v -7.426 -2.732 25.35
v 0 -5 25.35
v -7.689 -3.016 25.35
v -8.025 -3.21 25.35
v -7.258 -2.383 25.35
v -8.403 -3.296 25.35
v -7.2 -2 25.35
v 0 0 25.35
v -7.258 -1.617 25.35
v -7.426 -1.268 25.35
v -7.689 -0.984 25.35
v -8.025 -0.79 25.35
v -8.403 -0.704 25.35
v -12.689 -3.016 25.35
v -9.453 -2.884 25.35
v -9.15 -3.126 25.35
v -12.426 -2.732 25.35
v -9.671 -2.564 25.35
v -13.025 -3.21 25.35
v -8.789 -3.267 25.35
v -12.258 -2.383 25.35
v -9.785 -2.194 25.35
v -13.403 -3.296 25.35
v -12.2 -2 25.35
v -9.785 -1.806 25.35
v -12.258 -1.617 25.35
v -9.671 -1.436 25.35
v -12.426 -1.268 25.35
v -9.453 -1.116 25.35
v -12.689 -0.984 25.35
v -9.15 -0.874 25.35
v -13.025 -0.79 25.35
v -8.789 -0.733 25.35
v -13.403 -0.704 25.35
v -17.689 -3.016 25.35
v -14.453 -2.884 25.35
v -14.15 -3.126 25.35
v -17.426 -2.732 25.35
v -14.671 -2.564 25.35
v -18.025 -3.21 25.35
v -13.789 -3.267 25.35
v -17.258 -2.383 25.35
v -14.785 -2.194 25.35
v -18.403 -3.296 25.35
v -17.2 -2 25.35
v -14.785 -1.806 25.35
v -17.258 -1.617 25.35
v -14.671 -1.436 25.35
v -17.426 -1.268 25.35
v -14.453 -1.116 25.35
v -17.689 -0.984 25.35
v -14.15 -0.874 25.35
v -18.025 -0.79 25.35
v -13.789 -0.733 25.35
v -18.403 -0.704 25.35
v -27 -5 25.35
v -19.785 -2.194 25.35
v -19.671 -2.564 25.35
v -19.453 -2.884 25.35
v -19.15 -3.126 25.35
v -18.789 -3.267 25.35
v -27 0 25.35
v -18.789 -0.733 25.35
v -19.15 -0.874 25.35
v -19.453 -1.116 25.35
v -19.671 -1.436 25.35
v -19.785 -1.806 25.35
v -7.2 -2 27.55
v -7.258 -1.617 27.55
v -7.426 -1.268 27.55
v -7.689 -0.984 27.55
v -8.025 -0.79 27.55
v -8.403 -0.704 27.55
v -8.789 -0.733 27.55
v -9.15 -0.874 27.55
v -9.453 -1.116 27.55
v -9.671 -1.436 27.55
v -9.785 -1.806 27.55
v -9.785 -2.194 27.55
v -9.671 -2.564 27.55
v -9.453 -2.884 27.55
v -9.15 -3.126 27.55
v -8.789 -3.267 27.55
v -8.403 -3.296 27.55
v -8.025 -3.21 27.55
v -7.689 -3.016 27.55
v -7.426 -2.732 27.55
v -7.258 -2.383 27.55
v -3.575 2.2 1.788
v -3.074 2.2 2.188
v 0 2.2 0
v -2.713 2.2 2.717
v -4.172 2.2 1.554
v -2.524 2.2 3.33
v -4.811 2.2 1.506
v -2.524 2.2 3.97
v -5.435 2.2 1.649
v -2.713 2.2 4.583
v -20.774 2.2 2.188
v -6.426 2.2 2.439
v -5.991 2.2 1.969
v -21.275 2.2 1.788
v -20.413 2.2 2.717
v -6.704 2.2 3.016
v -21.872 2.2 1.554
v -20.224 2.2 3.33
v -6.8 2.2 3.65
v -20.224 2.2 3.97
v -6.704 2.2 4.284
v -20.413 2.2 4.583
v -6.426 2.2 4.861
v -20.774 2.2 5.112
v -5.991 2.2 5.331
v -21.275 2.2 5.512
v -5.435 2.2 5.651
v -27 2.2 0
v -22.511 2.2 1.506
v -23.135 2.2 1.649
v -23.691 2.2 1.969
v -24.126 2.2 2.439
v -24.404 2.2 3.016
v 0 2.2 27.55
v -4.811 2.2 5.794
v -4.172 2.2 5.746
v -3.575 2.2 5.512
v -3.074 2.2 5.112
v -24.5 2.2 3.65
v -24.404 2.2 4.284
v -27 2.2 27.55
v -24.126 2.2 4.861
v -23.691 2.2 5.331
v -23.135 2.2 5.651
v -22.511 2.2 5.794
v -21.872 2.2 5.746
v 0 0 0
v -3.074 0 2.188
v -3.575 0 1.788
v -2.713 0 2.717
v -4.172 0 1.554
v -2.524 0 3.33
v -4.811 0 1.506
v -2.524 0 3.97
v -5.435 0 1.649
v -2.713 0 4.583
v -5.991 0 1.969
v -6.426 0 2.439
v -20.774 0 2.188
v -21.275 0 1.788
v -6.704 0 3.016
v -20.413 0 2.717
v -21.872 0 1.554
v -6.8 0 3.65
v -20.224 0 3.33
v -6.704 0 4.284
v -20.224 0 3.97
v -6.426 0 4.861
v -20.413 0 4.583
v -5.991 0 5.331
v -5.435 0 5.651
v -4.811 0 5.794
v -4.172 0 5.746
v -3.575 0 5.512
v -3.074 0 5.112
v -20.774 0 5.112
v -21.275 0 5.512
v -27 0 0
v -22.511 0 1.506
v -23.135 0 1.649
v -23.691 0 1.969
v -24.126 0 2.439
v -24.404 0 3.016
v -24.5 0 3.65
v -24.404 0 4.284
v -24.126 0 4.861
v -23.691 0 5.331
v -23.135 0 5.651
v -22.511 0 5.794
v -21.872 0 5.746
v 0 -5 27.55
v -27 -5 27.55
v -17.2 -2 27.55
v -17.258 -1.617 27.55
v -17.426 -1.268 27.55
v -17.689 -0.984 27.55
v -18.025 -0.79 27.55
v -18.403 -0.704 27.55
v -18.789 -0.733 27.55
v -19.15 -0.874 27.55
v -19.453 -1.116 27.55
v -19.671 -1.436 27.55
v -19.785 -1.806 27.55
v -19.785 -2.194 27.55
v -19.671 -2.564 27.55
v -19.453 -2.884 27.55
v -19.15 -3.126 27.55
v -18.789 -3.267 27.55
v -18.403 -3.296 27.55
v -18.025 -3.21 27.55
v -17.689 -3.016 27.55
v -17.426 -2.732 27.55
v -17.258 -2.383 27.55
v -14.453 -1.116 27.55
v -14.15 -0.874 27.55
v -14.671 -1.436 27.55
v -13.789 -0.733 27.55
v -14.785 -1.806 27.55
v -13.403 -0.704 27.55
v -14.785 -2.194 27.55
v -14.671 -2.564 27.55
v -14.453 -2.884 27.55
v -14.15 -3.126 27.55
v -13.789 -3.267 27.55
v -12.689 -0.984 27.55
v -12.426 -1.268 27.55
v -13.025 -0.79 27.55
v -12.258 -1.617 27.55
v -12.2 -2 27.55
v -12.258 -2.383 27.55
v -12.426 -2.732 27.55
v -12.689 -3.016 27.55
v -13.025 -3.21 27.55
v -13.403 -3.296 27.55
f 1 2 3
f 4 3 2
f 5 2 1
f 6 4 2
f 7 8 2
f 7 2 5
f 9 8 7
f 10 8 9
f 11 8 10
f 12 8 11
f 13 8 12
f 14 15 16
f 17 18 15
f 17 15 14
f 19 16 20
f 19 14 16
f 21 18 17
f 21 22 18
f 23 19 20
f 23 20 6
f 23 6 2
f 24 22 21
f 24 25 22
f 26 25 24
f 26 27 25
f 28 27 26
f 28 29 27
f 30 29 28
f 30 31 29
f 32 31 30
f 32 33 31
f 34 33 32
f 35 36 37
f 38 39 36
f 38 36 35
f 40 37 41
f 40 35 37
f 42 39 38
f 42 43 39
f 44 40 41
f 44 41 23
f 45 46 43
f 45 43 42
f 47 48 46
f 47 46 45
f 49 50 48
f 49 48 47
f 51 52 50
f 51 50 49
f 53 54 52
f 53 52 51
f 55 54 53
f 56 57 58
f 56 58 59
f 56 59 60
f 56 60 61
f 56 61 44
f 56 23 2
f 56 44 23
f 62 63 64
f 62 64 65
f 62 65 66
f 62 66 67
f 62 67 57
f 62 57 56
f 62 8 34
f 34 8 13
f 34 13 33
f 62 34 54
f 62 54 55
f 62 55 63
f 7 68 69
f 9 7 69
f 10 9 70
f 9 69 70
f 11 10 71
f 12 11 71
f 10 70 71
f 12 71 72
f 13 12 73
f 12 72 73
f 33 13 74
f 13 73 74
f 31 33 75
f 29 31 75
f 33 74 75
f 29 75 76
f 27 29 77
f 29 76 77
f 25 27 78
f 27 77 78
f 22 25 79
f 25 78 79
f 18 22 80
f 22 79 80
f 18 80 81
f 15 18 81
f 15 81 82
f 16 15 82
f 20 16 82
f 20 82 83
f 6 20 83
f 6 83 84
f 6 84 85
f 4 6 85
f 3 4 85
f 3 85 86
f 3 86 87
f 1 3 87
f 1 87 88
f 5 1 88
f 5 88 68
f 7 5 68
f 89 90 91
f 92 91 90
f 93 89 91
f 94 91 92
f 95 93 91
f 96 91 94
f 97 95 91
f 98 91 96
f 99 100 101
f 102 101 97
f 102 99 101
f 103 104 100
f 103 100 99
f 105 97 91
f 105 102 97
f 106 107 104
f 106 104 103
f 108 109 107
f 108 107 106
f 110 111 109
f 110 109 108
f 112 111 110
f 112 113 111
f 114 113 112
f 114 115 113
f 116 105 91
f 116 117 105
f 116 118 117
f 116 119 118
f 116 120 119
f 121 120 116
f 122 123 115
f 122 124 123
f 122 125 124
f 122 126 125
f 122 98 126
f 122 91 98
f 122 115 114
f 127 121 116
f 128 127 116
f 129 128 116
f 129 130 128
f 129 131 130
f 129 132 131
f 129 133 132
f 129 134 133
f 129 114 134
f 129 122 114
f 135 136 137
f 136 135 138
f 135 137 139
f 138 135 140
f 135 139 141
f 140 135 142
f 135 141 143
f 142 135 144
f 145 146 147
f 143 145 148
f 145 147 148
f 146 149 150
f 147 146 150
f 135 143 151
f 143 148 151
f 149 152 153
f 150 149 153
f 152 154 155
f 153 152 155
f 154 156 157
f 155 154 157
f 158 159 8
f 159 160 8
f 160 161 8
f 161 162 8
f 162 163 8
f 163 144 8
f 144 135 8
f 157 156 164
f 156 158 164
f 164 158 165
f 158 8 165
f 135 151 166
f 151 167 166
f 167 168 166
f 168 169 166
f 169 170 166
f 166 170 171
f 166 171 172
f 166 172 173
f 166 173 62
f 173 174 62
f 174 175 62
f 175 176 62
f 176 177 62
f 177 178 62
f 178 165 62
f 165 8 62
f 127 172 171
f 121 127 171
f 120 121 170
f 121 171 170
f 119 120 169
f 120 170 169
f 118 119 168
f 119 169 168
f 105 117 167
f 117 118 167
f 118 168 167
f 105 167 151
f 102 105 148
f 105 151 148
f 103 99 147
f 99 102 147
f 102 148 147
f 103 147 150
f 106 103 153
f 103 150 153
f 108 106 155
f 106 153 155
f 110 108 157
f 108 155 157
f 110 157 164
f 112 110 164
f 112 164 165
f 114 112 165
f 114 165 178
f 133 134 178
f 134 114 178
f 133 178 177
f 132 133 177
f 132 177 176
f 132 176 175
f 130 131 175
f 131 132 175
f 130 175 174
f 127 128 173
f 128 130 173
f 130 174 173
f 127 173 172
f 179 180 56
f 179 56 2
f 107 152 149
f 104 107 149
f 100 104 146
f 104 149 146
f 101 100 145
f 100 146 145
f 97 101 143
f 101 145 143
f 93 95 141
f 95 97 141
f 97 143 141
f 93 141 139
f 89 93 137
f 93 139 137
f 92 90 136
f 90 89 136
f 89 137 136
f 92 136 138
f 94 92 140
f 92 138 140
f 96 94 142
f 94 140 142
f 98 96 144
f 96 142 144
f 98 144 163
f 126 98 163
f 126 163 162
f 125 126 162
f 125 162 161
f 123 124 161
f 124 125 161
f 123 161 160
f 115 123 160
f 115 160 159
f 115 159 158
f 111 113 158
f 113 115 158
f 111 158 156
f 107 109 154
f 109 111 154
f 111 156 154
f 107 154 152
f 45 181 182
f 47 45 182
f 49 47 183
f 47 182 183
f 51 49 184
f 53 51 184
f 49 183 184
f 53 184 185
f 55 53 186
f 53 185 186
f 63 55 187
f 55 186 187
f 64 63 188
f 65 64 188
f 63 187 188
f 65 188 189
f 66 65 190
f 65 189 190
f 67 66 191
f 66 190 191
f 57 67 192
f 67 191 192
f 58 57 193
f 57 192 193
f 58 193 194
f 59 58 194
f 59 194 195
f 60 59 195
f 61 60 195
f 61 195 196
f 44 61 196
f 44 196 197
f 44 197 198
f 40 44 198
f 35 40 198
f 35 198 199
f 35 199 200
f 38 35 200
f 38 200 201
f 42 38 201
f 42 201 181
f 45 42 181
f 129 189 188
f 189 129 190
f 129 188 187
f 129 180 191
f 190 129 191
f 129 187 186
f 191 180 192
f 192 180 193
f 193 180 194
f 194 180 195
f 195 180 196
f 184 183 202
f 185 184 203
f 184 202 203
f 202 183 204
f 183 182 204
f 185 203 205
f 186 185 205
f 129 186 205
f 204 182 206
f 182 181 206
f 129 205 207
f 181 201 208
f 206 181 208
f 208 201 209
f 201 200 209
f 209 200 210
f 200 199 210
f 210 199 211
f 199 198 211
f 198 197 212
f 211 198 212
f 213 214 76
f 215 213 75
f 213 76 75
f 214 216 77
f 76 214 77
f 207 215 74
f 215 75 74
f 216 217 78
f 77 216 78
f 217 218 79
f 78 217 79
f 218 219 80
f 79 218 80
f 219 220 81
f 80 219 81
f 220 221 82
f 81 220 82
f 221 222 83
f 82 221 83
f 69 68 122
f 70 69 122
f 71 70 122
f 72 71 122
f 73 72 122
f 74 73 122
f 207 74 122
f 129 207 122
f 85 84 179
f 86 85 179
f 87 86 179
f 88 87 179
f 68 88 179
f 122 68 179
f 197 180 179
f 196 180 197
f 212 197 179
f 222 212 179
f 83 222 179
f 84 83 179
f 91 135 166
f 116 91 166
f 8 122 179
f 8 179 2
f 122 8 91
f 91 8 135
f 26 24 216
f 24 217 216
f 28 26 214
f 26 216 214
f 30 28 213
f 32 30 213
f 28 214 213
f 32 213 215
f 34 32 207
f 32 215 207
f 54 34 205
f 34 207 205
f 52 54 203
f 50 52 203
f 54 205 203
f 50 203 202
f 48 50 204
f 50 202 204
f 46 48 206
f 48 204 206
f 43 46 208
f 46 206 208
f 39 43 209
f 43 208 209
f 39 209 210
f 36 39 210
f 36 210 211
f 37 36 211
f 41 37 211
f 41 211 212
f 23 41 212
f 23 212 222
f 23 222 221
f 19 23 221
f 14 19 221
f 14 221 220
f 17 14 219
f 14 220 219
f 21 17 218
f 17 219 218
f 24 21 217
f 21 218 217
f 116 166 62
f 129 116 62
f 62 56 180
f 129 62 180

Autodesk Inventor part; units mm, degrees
ref_plane "YZ Plane" through (0, 0, 0) normal (1, 0, 0) x (0, 1, 0)
ref_plane "XZ Plane" through (0, 0, 0) normal (0, 1, 0) x (-1, 0, 0)
ref_plane "XY Plane" through (0, 0, 0) normal (0, 0, 1) x (1, 0, 0)
sketch "Esquisse1" plane through (0, 0, 0) normal (0, 1, 0) x (-1, 0, 0)
  line L0 (0, 0) -> (27, 0)
  line L1 (27, 0) -> (27, 27.55)
  line L2 (27, 27.55) -> (0, 27.55)
  line L3 (0, 27.55) -> (0, 0)
  circle A0 centre (4.65, 3.65) radius 2.15
  line L4 (13.5, 27.55) -> (13.5, 0) construction
  circle A1 centre (22.35, 3.65) radius 2.15
  dimension "d0" = 27
  dimension "d1" = 27.55
  dimension "d2" = 4.3
  dimension "d3" = 3.65
  dimension "d4" = 4.65
extrude "Extrusion1" add sketch "Esquisse1" along normal blind 2.2
sketch "Esquisse2" plane through (0, 0, 0) normal (0, -1, 0) x (1, 0, 0)
  line L0 (0, 27.55) -> (0, 0) construction
  line L1 (-27, 27.55) -> (0, 27.55)
  line L2 (0, 27.55) -> (0, 25.35)
  line L3 (0, 25.35) -> (-27, 25.35)
  line L4 (-27, 25.35) -> (-27, 27.55)
  dimension "d7" = 2.2
extrude "Extrusion2" add sketch "Esquisse2" along normal blind 5
sketch "Esquisse3" plane through (-27, 2.2, 27.55) normal (0, 0, 1) x (1, 0, 0)
  line L0 (27, -7.2) -> (27, 0) construction
  line L1 (0, -7.2) -> (0, 0) construction
  line L2 (27, -7.2) -> (0, -7.2) construction
  line L3 (0, -4.2) -> (27, -4.2) construction
  circle A0 centre (13.5, -4.2) radius 1.3
  circle A1 centre (18.5, -4.2) radius 1.3
  circle A2 centre (8.5, -4.2) radius 1.3
  circle A3 centre (13.5, -4.2) radius 1.3
  point P0 (27, -2.2)
  dimension "d10" = 3
  dimension "d11" = 2.6
  dimension "d14" = 5
  dimension "d17" = 5
extrude "Extrusion3" cut sketch "Esquisse3" against normal through all
properties part number "BodyToOpenCM"
